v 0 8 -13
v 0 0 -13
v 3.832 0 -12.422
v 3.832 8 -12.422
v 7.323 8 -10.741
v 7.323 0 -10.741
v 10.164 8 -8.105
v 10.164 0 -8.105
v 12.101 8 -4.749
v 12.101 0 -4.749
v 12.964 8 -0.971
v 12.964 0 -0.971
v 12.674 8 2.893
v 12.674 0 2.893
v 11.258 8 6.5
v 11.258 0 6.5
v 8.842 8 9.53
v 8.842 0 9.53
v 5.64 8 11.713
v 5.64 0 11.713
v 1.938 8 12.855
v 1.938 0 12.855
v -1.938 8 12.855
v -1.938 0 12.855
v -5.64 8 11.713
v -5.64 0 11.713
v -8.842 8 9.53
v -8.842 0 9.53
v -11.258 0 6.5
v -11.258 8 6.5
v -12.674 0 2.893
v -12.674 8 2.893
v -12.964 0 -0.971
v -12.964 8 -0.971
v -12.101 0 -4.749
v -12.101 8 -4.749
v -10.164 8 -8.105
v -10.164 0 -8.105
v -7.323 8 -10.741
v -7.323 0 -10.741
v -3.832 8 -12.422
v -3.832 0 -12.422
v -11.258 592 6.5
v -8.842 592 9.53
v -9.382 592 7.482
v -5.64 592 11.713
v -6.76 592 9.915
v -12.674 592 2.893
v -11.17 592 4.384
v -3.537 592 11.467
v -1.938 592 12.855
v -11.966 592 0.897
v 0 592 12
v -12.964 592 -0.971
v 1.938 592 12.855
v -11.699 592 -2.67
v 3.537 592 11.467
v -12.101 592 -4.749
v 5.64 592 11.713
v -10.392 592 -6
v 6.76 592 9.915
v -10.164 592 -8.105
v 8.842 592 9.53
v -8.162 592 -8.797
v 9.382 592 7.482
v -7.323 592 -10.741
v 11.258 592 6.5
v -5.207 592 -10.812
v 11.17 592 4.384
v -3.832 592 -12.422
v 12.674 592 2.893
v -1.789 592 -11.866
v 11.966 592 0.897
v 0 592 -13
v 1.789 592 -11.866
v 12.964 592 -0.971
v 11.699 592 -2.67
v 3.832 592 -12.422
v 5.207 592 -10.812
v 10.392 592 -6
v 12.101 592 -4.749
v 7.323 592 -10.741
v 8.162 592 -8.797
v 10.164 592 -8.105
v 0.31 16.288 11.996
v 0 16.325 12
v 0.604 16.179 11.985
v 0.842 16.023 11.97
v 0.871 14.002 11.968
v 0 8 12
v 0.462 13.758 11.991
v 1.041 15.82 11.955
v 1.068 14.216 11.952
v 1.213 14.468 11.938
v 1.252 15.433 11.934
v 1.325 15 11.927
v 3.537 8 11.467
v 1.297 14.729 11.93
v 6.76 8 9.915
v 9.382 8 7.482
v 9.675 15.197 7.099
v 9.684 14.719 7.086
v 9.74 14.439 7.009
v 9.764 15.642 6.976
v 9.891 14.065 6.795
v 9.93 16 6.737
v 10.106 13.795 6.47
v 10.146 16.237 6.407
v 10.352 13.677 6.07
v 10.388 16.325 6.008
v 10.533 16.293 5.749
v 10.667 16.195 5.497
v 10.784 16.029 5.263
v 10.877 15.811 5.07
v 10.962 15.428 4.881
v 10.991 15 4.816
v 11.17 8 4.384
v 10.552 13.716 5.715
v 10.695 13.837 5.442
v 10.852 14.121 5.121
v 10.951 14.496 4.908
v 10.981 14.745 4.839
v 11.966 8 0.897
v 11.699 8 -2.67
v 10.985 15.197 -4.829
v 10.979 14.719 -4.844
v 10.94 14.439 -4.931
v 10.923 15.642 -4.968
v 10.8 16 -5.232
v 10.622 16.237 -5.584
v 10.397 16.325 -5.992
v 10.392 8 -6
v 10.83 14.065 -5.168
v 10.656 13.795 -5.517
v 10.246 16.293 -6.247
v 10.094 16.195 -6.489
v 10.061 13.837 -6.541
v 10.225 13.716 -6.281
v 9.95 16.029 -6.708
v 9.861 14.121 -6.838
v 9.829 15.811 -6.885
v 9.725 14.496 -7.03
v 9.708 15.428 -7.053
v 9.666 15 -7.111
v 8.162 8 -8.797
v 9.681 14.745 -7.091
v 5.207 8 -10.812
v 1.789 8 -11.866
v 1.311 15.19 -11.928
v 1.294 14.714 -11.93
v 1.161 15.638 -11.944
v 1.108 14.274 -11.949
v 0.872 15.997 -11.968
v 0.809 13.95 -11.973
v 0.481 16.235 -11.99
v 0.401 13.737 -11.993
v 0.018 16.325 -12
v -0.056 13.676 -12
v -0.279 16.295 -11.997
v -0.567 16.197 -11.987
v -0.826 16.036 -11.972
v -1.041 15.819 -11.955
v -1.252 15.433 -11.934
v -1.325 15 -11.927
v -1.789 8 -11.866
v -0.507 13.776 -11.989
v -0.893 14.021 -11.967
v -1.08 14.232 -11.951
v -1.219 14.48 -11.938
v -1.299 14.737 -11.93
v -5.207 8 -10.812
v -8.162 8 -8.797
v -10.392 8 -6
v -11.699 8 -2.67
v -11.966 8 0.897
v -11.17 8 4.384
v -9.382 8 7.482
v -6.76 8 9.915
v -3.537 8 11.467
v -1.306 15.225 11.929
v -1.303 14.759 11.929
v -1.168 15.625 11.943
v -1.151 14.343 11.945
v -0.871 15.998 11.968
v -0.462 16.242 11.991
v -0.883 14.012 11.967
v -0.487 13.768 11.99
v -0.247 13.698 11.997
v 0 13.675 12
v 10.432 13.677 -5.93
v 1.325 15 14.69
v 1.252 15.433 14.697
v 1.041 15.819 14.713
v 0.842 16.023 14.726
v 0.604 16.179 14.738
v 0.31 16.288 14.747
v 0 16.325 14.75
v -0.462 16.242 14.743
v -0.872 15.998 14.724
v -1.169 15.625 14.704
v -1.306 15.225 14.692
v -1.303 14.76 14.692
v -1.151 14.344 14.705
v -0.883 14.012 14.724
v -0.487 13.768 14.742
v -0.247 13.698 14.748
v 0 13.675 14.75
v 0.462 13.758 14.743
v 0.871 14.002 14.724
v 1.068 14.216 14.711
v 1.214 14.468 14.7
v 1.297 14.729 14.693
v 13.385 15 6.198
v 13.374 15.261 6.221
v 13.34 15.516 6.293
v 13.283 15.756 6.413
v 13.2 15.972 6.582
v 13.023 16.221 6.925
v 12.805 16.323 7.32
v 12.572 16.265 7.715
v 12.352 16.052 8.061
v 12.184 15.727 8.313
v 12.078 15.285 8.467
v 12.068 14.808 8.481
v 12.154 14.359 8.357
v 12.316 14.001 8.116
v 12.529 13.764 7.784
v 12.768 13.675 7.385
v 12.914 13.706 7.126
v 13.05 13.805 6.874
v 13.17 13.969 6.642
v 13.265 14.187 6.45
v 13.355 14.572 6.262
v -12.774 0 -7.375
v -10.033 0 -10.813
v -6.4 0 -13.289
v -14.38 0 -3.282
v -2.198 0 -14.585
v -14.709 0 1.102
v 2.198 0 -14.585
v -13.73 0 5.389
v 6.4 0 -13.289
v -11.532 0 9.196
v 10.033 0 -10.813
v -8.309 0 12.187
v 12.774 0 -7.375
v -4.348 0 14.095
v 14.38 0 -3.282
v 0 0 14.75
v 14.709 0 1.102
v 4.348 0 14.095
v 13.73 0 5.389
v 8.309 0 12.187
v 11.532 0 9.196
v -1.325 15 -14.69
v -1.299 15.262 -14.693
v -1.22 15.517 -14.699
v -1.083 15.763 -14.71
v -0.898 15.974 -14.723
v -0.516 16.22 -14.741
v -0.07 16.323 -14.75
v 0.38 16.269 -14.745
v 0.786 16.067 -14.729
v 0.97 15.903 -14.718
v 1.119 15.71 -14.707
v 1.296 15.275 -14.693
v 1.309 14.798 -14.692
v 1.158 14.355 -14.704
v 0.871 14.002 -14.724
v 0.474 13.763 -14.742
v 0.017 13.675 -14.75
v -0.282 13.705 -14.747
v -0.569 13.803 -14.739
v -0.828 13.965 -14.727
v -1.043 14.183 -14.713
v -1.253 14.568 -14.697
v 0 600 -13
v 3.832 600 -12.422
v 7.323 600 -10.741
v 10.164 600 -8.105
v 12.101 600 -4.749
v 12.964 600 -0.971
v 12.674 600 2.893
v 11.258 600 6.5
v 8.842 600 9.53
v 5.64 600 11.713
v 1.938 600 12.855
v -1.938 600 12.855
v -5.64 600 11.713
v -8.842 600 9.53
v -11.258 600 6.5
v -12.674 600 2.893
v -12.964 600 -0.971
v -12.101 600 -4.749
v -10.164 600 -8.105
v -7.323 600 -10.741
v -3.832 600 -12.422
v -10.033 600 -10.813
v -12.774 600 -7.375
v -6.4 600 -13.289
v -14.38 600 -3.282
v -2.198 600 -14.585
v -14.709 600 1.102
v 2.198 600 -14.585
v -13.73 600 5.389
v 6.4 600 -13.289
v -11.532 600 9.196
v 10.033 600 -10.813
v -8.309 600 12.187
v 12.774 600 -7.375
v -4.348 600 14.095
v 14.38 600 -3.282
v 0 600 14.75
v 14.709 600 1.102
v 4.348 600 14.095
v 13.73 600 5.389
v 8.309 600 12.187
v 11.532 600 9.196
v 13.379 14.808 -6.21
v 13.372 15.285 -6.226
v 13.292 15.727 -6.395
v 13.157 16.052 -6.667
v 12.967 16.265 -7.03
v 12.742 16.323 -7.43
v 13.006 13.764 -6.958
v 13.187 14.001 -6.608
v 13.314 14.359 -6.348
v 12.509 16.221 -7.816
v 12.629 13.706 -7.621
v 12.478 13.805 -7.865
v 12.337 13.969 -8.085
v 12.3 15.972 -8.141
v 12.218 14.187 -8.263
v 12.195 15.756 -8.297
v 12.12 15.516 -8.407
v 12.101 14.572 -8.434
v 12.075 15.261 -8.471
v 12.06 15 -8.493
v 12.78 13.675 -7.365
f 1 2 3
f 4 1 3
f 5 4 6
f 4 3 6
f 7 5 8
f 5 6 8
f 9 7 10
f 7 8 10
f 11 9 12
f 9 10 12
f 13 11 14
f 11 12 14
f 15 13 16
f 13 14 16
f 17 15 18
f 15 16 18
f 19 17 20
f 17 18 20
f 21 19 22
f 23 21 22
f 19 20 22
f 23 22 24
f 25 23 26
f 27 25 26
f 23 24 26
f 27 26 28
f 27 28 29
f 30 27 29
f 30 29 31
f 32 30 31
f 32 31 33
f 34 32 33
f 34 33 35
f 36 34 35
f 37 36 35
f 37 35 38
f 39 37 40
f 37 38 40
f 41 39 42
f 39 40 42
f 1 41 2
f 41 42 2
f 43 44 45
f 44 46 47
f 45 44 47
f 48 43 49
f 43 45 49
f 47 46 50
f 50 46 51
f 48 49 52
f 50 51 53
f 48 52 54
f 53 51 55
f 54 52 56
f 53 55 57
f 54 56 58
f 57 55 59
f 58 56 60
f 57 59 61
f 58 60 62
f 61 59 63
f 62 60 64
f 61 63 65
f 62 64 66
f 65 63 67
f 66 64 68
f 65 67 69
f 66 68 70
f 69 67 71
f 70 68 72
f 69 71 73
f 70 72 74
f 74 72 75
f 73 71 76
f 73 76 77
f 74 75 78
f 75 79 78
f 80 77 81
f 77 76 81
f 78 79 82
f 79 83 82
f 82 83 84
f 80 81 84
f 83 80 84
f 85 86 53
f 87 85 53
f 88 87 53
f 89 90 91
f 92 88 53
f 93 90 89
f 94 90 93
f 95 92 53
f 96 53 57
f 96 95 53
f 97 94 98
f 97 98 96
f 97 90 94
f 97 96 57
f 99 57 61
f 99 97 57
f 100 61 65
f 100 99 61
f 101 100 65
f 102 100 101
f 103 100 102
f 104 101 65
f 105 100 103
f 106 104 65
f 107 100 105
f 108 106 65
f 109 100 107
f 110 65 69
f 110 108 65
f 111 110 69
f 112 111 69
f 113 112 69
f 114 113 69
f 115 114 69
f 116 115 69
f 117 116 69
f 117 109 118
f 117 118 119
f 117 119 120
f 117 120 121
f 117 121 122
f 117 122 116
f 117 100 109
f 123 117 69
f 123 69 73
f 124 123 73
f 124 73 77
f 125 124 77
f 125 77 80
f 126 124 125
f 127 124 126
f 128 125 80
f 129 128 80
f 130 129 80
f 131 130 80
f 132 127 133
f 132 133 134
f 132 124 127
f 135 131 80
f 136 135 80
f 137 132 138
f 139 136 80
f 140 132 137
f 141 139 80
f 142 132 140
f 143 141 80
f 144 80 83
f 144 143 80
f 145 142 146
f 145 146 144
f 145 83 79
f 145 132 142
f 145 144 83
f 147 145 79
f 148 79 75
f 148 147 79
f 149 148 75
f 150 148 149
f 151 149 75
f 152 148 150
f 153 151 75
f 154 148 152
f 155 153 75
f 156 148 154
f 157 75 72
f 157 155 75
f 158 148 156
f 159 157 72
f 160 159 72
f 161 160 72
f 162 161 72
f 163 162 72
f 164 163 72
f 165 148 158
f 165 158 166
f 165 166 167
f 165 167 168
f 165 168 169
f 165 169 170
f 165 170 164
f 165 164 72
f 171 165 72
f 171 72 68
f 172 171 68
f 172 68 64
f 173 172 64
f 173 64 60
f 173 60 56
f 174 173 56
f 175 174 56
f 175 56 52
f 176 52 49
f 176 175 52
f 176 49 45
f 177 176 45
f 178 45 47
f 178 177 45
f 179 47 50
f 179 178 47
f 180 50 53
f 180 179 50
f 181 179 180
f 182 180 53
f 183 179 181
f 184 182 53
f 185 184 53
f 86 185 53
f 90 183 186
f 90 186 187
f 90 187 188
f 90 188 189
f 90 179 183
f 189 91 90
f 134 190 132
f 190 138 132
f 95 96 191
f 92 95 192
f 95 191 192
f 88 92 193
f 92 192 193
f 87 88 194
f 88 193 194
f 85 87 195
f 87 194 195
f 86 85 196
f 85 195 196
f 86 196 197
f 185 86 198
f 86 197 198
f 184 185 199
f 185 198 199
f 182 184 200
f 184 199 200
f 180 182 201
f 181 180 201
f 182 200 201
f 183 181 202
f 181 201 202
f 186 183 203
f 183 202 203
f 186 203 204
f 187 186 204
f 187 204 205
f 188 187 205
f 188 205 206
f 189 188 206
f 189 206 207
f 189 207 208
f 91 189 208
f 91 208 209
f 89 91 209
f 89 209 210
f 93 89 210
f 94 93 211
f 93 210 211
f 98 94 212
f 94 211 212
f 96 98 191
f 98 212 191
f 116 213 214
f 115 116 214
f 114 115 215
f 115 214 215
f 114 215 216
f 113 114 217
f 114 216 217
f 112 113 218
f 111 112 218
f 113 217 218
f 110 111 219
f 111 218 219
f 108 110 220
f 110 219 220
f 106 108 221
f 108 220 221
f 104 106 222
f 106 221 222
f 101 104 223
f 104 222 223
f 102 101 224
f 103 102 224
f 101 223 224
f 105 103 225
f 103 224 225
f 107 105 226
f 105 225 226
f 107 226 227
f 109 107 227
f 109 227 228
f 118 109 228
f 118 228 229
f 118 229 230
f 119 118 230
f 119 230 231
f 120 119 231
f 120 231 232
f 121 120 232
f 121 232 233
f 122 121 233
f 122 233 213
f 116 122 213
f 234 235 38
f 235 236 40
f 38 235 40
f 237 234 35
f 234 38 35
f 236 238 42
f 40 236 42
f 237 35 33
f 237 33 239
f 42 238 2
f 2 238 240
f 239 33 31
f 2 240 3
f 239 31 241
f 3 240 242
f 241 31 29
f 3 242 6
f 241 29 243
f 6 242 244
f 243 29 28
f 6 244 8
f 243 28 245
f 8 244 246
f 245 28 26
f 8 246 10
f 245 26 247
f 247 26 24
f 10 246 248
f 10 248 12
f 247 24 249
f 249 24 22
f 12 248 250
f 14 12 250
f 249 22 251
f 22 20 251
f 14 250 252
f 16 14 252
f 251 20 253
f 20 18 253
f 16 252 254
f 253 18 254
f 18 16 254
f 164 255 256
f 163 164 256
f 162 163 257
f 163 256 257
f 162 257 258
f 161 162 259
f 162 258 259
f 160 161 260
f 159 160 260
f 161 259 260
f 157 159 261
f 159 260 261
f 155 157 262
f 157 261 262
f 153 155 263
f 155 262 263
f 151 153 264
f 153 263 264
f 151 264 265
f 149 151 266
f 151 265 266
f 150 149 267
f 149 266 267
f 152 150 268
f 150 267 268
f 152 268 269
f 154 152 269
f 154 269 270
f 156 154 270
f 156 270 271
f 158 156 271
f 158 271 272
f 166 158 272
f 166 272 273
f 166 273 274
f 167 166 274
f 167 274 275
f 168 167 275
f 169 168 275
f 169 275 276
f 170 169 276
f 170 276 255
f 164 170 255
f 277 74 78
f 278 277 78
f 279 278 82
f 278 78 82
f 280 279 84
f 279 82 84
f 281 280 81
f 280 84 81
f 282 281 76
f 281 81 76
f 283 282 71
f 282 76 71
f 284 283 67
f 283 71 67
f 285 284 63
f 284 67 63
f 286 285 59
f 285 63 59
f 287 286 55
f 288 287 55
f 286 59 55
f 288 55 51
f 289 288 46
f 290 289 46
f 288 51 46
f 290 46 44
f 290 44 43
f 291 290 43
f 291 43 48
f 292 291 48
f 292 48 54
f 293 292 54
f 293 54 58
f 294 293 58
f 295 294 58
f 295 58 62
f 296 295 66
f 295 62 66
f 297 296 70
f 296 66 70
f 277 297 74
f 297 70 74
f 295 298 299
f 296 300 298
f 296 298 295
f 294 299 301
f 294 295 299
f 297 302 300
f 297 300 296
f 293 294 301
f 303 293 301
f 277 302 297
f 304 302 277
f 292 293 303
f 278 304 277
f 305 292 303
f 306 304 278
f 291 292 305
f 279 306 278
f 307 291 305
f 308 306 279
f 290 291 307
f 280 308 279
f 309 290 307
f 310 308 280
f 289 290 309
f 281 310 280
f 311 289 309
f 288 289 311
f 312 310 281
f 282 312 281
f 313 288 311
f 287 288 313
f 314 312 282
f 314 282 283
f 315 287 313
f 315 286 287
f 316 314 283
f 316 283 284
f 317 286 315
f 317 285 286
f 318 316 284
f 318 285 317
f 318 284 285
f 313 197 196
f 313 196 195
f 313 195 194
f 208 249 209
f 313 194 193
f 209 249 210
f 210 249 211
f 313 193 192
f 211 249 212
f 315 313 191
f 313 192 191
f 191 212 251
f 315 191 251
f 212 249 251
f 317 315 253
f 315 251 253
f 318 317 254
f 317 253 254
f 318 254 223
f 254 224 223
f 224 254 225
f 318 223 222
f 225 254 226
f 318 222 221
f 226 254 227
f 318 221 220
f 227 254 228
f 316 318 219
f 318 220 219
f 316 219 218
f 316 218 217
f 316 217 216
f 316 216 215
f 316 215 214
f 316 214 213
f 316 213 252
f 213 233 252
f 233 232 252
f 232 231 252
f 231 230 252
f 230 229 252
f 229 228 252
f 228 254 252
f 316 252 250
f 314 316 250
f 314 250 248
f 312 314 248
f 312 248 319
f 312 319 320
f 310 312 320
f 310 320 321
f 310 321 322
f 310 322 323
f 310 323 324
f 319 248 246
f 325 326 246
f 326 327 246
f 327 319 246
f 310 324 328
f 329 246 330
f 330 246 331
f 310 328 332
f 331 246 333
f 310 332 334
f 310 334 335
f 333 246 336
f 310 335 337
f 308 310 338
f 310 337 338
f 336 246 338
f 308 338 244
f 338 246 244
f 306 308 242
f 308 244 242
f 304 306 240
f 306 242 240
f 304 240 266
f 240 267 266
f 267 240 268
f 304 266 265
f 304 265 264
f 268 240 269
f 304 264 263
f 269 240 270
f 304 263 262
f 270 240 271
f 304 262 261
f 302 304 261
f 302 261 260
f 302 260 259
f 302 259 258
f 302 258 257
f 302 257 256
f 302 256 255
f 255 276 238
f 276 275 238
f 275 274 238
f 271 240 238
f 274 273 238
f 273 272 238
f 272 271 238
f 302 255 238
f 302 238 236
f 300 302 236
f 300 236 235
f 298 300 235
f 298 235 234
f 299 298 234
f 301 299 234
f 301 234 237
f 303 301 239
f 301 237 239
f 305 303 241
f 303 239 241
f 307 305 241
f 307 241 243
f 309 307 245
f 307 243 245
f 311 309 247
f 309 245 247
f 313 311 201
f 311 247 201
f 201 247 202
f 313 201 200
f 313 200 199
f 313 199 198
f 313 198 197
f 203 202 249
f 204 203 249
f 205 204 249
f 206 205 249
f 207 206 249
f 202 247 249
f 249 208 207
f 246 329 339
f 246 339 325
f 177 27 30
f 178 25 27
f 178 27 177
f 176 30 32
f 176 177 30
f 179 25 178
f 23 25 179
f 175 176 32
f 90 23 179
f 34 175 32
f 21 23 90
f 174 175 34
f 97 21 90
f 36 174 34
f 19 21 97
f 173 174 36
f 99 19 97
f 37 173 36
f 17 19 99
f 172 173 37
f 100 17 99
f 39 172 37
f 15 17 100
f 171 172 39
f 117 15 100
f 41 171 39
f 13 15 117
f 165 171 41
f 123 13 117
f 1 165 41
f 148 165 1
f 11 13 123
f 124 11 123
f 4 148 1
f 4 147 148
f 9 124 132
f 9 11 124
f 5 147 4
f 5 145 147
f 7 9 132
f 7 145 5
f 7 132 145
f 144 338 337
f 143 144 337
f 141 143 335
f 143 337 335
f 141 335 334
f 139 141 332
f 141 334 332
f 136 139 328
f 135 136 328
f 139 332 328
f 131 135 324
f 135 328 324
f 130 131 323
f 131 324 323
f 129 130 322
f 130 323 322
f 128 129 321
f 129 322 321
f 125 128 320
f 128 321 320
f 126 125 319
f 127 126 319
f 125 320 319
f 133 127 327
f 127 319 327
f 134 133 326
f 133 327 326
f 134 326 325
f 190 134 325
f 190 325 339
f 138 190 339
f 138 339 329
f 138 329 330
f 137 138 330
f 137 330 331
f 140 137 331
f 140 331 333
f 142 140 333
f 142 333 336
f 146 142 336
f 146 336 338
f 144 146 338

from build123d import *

# Parameters (mm, degrees)
SKETCH1_R           = 14.75
SKETCH1_R_2         = 12
BOSS_EXTRUDE1_DEPTH = 600
SKETCH4_R           = 1.325
CUT_EXTRUDE2_DEPTH  = 10
CIRPATTERN2_COUNT   = 4
CIRPATTERN2_ANGLE   = 180
SKETCH5_R           = 13
SKETCH5_R_2         = 12
CUT_EXTRUDE3_DEPTH  = 8
LPATTERN1_COUNT     = 2
LPATTERN1_PITCH     = 592


with BuildPart() as part:
    # Sketch1 → Boss-Extrude1 (new body)
    with BuildSketch(Plane(origin=(0, 0, 0), x_dir=(1, 0, 0), z_dir=(0, 1, 0))):
        with Locations(Location((0, 0, 0), (0, 0, 270))):
            Circle(SKETCH1_R)
        with Locations(Location((0, 0, 0), (0, 0, 270))):
            Circle(SKETCH1_R_2, mode=Mode.SUBTRACT)
    extrude(amount=BOSS_EXTRUDE1_DEPTH)

    # Sketch4 → Cut-Extrude2 (cut)
    with BuildSketch(Plane.XY.offset(14.75)):
        with Locations((0, 15)):
            Circle(SKETCH4_R)
    cut_extrude2 = extrude(amount=-CUT_EXTRUDE2_DEPTH, mode=Mode.SUBTRACT)

    # CirPattern2: Cut-Extrude2 ×4 about axis
    cirpattern2_axis = Axis((0, 600, 0), (0, 1, 0))
    for i in range(1, CIRPATTERN2_COUNT):
        add(cut_extrude2.rotate(cirpattern2_axis, i * CIRPATTERN2_ANGLE / (CIRPATTERN2_COUNT - 1)), mode=Mode.SUBTRACT)

    # Sketch5 → Cut-Extrude3 (cut)
    with BuildSketch(Plane.XZ):
        with Locations(Location((0, 0, 0), (0, 0, 270))):
            Circle(SKETCH5_R)
        with Locations(Location((0, 0, 0), (0, 0, 270))):
            Circle(SKETCH5_R_2, mode=Mode.SUBTRACT)
    cut_extrude3 = extrude(amount=-CUT_EXTRUDE3_DEPTH, mode=Mode.SUBTRACT)

    # LPattern1: Cut-Extrude3 ×2
    with Locations(*[(0, i * LPATTERN1_PITCH, 0) for i in range(1, LPATTERN1_COUNT)]):
        add(cut_extrude3, mode=Mode.SUBTRACT)


solid = part.part
